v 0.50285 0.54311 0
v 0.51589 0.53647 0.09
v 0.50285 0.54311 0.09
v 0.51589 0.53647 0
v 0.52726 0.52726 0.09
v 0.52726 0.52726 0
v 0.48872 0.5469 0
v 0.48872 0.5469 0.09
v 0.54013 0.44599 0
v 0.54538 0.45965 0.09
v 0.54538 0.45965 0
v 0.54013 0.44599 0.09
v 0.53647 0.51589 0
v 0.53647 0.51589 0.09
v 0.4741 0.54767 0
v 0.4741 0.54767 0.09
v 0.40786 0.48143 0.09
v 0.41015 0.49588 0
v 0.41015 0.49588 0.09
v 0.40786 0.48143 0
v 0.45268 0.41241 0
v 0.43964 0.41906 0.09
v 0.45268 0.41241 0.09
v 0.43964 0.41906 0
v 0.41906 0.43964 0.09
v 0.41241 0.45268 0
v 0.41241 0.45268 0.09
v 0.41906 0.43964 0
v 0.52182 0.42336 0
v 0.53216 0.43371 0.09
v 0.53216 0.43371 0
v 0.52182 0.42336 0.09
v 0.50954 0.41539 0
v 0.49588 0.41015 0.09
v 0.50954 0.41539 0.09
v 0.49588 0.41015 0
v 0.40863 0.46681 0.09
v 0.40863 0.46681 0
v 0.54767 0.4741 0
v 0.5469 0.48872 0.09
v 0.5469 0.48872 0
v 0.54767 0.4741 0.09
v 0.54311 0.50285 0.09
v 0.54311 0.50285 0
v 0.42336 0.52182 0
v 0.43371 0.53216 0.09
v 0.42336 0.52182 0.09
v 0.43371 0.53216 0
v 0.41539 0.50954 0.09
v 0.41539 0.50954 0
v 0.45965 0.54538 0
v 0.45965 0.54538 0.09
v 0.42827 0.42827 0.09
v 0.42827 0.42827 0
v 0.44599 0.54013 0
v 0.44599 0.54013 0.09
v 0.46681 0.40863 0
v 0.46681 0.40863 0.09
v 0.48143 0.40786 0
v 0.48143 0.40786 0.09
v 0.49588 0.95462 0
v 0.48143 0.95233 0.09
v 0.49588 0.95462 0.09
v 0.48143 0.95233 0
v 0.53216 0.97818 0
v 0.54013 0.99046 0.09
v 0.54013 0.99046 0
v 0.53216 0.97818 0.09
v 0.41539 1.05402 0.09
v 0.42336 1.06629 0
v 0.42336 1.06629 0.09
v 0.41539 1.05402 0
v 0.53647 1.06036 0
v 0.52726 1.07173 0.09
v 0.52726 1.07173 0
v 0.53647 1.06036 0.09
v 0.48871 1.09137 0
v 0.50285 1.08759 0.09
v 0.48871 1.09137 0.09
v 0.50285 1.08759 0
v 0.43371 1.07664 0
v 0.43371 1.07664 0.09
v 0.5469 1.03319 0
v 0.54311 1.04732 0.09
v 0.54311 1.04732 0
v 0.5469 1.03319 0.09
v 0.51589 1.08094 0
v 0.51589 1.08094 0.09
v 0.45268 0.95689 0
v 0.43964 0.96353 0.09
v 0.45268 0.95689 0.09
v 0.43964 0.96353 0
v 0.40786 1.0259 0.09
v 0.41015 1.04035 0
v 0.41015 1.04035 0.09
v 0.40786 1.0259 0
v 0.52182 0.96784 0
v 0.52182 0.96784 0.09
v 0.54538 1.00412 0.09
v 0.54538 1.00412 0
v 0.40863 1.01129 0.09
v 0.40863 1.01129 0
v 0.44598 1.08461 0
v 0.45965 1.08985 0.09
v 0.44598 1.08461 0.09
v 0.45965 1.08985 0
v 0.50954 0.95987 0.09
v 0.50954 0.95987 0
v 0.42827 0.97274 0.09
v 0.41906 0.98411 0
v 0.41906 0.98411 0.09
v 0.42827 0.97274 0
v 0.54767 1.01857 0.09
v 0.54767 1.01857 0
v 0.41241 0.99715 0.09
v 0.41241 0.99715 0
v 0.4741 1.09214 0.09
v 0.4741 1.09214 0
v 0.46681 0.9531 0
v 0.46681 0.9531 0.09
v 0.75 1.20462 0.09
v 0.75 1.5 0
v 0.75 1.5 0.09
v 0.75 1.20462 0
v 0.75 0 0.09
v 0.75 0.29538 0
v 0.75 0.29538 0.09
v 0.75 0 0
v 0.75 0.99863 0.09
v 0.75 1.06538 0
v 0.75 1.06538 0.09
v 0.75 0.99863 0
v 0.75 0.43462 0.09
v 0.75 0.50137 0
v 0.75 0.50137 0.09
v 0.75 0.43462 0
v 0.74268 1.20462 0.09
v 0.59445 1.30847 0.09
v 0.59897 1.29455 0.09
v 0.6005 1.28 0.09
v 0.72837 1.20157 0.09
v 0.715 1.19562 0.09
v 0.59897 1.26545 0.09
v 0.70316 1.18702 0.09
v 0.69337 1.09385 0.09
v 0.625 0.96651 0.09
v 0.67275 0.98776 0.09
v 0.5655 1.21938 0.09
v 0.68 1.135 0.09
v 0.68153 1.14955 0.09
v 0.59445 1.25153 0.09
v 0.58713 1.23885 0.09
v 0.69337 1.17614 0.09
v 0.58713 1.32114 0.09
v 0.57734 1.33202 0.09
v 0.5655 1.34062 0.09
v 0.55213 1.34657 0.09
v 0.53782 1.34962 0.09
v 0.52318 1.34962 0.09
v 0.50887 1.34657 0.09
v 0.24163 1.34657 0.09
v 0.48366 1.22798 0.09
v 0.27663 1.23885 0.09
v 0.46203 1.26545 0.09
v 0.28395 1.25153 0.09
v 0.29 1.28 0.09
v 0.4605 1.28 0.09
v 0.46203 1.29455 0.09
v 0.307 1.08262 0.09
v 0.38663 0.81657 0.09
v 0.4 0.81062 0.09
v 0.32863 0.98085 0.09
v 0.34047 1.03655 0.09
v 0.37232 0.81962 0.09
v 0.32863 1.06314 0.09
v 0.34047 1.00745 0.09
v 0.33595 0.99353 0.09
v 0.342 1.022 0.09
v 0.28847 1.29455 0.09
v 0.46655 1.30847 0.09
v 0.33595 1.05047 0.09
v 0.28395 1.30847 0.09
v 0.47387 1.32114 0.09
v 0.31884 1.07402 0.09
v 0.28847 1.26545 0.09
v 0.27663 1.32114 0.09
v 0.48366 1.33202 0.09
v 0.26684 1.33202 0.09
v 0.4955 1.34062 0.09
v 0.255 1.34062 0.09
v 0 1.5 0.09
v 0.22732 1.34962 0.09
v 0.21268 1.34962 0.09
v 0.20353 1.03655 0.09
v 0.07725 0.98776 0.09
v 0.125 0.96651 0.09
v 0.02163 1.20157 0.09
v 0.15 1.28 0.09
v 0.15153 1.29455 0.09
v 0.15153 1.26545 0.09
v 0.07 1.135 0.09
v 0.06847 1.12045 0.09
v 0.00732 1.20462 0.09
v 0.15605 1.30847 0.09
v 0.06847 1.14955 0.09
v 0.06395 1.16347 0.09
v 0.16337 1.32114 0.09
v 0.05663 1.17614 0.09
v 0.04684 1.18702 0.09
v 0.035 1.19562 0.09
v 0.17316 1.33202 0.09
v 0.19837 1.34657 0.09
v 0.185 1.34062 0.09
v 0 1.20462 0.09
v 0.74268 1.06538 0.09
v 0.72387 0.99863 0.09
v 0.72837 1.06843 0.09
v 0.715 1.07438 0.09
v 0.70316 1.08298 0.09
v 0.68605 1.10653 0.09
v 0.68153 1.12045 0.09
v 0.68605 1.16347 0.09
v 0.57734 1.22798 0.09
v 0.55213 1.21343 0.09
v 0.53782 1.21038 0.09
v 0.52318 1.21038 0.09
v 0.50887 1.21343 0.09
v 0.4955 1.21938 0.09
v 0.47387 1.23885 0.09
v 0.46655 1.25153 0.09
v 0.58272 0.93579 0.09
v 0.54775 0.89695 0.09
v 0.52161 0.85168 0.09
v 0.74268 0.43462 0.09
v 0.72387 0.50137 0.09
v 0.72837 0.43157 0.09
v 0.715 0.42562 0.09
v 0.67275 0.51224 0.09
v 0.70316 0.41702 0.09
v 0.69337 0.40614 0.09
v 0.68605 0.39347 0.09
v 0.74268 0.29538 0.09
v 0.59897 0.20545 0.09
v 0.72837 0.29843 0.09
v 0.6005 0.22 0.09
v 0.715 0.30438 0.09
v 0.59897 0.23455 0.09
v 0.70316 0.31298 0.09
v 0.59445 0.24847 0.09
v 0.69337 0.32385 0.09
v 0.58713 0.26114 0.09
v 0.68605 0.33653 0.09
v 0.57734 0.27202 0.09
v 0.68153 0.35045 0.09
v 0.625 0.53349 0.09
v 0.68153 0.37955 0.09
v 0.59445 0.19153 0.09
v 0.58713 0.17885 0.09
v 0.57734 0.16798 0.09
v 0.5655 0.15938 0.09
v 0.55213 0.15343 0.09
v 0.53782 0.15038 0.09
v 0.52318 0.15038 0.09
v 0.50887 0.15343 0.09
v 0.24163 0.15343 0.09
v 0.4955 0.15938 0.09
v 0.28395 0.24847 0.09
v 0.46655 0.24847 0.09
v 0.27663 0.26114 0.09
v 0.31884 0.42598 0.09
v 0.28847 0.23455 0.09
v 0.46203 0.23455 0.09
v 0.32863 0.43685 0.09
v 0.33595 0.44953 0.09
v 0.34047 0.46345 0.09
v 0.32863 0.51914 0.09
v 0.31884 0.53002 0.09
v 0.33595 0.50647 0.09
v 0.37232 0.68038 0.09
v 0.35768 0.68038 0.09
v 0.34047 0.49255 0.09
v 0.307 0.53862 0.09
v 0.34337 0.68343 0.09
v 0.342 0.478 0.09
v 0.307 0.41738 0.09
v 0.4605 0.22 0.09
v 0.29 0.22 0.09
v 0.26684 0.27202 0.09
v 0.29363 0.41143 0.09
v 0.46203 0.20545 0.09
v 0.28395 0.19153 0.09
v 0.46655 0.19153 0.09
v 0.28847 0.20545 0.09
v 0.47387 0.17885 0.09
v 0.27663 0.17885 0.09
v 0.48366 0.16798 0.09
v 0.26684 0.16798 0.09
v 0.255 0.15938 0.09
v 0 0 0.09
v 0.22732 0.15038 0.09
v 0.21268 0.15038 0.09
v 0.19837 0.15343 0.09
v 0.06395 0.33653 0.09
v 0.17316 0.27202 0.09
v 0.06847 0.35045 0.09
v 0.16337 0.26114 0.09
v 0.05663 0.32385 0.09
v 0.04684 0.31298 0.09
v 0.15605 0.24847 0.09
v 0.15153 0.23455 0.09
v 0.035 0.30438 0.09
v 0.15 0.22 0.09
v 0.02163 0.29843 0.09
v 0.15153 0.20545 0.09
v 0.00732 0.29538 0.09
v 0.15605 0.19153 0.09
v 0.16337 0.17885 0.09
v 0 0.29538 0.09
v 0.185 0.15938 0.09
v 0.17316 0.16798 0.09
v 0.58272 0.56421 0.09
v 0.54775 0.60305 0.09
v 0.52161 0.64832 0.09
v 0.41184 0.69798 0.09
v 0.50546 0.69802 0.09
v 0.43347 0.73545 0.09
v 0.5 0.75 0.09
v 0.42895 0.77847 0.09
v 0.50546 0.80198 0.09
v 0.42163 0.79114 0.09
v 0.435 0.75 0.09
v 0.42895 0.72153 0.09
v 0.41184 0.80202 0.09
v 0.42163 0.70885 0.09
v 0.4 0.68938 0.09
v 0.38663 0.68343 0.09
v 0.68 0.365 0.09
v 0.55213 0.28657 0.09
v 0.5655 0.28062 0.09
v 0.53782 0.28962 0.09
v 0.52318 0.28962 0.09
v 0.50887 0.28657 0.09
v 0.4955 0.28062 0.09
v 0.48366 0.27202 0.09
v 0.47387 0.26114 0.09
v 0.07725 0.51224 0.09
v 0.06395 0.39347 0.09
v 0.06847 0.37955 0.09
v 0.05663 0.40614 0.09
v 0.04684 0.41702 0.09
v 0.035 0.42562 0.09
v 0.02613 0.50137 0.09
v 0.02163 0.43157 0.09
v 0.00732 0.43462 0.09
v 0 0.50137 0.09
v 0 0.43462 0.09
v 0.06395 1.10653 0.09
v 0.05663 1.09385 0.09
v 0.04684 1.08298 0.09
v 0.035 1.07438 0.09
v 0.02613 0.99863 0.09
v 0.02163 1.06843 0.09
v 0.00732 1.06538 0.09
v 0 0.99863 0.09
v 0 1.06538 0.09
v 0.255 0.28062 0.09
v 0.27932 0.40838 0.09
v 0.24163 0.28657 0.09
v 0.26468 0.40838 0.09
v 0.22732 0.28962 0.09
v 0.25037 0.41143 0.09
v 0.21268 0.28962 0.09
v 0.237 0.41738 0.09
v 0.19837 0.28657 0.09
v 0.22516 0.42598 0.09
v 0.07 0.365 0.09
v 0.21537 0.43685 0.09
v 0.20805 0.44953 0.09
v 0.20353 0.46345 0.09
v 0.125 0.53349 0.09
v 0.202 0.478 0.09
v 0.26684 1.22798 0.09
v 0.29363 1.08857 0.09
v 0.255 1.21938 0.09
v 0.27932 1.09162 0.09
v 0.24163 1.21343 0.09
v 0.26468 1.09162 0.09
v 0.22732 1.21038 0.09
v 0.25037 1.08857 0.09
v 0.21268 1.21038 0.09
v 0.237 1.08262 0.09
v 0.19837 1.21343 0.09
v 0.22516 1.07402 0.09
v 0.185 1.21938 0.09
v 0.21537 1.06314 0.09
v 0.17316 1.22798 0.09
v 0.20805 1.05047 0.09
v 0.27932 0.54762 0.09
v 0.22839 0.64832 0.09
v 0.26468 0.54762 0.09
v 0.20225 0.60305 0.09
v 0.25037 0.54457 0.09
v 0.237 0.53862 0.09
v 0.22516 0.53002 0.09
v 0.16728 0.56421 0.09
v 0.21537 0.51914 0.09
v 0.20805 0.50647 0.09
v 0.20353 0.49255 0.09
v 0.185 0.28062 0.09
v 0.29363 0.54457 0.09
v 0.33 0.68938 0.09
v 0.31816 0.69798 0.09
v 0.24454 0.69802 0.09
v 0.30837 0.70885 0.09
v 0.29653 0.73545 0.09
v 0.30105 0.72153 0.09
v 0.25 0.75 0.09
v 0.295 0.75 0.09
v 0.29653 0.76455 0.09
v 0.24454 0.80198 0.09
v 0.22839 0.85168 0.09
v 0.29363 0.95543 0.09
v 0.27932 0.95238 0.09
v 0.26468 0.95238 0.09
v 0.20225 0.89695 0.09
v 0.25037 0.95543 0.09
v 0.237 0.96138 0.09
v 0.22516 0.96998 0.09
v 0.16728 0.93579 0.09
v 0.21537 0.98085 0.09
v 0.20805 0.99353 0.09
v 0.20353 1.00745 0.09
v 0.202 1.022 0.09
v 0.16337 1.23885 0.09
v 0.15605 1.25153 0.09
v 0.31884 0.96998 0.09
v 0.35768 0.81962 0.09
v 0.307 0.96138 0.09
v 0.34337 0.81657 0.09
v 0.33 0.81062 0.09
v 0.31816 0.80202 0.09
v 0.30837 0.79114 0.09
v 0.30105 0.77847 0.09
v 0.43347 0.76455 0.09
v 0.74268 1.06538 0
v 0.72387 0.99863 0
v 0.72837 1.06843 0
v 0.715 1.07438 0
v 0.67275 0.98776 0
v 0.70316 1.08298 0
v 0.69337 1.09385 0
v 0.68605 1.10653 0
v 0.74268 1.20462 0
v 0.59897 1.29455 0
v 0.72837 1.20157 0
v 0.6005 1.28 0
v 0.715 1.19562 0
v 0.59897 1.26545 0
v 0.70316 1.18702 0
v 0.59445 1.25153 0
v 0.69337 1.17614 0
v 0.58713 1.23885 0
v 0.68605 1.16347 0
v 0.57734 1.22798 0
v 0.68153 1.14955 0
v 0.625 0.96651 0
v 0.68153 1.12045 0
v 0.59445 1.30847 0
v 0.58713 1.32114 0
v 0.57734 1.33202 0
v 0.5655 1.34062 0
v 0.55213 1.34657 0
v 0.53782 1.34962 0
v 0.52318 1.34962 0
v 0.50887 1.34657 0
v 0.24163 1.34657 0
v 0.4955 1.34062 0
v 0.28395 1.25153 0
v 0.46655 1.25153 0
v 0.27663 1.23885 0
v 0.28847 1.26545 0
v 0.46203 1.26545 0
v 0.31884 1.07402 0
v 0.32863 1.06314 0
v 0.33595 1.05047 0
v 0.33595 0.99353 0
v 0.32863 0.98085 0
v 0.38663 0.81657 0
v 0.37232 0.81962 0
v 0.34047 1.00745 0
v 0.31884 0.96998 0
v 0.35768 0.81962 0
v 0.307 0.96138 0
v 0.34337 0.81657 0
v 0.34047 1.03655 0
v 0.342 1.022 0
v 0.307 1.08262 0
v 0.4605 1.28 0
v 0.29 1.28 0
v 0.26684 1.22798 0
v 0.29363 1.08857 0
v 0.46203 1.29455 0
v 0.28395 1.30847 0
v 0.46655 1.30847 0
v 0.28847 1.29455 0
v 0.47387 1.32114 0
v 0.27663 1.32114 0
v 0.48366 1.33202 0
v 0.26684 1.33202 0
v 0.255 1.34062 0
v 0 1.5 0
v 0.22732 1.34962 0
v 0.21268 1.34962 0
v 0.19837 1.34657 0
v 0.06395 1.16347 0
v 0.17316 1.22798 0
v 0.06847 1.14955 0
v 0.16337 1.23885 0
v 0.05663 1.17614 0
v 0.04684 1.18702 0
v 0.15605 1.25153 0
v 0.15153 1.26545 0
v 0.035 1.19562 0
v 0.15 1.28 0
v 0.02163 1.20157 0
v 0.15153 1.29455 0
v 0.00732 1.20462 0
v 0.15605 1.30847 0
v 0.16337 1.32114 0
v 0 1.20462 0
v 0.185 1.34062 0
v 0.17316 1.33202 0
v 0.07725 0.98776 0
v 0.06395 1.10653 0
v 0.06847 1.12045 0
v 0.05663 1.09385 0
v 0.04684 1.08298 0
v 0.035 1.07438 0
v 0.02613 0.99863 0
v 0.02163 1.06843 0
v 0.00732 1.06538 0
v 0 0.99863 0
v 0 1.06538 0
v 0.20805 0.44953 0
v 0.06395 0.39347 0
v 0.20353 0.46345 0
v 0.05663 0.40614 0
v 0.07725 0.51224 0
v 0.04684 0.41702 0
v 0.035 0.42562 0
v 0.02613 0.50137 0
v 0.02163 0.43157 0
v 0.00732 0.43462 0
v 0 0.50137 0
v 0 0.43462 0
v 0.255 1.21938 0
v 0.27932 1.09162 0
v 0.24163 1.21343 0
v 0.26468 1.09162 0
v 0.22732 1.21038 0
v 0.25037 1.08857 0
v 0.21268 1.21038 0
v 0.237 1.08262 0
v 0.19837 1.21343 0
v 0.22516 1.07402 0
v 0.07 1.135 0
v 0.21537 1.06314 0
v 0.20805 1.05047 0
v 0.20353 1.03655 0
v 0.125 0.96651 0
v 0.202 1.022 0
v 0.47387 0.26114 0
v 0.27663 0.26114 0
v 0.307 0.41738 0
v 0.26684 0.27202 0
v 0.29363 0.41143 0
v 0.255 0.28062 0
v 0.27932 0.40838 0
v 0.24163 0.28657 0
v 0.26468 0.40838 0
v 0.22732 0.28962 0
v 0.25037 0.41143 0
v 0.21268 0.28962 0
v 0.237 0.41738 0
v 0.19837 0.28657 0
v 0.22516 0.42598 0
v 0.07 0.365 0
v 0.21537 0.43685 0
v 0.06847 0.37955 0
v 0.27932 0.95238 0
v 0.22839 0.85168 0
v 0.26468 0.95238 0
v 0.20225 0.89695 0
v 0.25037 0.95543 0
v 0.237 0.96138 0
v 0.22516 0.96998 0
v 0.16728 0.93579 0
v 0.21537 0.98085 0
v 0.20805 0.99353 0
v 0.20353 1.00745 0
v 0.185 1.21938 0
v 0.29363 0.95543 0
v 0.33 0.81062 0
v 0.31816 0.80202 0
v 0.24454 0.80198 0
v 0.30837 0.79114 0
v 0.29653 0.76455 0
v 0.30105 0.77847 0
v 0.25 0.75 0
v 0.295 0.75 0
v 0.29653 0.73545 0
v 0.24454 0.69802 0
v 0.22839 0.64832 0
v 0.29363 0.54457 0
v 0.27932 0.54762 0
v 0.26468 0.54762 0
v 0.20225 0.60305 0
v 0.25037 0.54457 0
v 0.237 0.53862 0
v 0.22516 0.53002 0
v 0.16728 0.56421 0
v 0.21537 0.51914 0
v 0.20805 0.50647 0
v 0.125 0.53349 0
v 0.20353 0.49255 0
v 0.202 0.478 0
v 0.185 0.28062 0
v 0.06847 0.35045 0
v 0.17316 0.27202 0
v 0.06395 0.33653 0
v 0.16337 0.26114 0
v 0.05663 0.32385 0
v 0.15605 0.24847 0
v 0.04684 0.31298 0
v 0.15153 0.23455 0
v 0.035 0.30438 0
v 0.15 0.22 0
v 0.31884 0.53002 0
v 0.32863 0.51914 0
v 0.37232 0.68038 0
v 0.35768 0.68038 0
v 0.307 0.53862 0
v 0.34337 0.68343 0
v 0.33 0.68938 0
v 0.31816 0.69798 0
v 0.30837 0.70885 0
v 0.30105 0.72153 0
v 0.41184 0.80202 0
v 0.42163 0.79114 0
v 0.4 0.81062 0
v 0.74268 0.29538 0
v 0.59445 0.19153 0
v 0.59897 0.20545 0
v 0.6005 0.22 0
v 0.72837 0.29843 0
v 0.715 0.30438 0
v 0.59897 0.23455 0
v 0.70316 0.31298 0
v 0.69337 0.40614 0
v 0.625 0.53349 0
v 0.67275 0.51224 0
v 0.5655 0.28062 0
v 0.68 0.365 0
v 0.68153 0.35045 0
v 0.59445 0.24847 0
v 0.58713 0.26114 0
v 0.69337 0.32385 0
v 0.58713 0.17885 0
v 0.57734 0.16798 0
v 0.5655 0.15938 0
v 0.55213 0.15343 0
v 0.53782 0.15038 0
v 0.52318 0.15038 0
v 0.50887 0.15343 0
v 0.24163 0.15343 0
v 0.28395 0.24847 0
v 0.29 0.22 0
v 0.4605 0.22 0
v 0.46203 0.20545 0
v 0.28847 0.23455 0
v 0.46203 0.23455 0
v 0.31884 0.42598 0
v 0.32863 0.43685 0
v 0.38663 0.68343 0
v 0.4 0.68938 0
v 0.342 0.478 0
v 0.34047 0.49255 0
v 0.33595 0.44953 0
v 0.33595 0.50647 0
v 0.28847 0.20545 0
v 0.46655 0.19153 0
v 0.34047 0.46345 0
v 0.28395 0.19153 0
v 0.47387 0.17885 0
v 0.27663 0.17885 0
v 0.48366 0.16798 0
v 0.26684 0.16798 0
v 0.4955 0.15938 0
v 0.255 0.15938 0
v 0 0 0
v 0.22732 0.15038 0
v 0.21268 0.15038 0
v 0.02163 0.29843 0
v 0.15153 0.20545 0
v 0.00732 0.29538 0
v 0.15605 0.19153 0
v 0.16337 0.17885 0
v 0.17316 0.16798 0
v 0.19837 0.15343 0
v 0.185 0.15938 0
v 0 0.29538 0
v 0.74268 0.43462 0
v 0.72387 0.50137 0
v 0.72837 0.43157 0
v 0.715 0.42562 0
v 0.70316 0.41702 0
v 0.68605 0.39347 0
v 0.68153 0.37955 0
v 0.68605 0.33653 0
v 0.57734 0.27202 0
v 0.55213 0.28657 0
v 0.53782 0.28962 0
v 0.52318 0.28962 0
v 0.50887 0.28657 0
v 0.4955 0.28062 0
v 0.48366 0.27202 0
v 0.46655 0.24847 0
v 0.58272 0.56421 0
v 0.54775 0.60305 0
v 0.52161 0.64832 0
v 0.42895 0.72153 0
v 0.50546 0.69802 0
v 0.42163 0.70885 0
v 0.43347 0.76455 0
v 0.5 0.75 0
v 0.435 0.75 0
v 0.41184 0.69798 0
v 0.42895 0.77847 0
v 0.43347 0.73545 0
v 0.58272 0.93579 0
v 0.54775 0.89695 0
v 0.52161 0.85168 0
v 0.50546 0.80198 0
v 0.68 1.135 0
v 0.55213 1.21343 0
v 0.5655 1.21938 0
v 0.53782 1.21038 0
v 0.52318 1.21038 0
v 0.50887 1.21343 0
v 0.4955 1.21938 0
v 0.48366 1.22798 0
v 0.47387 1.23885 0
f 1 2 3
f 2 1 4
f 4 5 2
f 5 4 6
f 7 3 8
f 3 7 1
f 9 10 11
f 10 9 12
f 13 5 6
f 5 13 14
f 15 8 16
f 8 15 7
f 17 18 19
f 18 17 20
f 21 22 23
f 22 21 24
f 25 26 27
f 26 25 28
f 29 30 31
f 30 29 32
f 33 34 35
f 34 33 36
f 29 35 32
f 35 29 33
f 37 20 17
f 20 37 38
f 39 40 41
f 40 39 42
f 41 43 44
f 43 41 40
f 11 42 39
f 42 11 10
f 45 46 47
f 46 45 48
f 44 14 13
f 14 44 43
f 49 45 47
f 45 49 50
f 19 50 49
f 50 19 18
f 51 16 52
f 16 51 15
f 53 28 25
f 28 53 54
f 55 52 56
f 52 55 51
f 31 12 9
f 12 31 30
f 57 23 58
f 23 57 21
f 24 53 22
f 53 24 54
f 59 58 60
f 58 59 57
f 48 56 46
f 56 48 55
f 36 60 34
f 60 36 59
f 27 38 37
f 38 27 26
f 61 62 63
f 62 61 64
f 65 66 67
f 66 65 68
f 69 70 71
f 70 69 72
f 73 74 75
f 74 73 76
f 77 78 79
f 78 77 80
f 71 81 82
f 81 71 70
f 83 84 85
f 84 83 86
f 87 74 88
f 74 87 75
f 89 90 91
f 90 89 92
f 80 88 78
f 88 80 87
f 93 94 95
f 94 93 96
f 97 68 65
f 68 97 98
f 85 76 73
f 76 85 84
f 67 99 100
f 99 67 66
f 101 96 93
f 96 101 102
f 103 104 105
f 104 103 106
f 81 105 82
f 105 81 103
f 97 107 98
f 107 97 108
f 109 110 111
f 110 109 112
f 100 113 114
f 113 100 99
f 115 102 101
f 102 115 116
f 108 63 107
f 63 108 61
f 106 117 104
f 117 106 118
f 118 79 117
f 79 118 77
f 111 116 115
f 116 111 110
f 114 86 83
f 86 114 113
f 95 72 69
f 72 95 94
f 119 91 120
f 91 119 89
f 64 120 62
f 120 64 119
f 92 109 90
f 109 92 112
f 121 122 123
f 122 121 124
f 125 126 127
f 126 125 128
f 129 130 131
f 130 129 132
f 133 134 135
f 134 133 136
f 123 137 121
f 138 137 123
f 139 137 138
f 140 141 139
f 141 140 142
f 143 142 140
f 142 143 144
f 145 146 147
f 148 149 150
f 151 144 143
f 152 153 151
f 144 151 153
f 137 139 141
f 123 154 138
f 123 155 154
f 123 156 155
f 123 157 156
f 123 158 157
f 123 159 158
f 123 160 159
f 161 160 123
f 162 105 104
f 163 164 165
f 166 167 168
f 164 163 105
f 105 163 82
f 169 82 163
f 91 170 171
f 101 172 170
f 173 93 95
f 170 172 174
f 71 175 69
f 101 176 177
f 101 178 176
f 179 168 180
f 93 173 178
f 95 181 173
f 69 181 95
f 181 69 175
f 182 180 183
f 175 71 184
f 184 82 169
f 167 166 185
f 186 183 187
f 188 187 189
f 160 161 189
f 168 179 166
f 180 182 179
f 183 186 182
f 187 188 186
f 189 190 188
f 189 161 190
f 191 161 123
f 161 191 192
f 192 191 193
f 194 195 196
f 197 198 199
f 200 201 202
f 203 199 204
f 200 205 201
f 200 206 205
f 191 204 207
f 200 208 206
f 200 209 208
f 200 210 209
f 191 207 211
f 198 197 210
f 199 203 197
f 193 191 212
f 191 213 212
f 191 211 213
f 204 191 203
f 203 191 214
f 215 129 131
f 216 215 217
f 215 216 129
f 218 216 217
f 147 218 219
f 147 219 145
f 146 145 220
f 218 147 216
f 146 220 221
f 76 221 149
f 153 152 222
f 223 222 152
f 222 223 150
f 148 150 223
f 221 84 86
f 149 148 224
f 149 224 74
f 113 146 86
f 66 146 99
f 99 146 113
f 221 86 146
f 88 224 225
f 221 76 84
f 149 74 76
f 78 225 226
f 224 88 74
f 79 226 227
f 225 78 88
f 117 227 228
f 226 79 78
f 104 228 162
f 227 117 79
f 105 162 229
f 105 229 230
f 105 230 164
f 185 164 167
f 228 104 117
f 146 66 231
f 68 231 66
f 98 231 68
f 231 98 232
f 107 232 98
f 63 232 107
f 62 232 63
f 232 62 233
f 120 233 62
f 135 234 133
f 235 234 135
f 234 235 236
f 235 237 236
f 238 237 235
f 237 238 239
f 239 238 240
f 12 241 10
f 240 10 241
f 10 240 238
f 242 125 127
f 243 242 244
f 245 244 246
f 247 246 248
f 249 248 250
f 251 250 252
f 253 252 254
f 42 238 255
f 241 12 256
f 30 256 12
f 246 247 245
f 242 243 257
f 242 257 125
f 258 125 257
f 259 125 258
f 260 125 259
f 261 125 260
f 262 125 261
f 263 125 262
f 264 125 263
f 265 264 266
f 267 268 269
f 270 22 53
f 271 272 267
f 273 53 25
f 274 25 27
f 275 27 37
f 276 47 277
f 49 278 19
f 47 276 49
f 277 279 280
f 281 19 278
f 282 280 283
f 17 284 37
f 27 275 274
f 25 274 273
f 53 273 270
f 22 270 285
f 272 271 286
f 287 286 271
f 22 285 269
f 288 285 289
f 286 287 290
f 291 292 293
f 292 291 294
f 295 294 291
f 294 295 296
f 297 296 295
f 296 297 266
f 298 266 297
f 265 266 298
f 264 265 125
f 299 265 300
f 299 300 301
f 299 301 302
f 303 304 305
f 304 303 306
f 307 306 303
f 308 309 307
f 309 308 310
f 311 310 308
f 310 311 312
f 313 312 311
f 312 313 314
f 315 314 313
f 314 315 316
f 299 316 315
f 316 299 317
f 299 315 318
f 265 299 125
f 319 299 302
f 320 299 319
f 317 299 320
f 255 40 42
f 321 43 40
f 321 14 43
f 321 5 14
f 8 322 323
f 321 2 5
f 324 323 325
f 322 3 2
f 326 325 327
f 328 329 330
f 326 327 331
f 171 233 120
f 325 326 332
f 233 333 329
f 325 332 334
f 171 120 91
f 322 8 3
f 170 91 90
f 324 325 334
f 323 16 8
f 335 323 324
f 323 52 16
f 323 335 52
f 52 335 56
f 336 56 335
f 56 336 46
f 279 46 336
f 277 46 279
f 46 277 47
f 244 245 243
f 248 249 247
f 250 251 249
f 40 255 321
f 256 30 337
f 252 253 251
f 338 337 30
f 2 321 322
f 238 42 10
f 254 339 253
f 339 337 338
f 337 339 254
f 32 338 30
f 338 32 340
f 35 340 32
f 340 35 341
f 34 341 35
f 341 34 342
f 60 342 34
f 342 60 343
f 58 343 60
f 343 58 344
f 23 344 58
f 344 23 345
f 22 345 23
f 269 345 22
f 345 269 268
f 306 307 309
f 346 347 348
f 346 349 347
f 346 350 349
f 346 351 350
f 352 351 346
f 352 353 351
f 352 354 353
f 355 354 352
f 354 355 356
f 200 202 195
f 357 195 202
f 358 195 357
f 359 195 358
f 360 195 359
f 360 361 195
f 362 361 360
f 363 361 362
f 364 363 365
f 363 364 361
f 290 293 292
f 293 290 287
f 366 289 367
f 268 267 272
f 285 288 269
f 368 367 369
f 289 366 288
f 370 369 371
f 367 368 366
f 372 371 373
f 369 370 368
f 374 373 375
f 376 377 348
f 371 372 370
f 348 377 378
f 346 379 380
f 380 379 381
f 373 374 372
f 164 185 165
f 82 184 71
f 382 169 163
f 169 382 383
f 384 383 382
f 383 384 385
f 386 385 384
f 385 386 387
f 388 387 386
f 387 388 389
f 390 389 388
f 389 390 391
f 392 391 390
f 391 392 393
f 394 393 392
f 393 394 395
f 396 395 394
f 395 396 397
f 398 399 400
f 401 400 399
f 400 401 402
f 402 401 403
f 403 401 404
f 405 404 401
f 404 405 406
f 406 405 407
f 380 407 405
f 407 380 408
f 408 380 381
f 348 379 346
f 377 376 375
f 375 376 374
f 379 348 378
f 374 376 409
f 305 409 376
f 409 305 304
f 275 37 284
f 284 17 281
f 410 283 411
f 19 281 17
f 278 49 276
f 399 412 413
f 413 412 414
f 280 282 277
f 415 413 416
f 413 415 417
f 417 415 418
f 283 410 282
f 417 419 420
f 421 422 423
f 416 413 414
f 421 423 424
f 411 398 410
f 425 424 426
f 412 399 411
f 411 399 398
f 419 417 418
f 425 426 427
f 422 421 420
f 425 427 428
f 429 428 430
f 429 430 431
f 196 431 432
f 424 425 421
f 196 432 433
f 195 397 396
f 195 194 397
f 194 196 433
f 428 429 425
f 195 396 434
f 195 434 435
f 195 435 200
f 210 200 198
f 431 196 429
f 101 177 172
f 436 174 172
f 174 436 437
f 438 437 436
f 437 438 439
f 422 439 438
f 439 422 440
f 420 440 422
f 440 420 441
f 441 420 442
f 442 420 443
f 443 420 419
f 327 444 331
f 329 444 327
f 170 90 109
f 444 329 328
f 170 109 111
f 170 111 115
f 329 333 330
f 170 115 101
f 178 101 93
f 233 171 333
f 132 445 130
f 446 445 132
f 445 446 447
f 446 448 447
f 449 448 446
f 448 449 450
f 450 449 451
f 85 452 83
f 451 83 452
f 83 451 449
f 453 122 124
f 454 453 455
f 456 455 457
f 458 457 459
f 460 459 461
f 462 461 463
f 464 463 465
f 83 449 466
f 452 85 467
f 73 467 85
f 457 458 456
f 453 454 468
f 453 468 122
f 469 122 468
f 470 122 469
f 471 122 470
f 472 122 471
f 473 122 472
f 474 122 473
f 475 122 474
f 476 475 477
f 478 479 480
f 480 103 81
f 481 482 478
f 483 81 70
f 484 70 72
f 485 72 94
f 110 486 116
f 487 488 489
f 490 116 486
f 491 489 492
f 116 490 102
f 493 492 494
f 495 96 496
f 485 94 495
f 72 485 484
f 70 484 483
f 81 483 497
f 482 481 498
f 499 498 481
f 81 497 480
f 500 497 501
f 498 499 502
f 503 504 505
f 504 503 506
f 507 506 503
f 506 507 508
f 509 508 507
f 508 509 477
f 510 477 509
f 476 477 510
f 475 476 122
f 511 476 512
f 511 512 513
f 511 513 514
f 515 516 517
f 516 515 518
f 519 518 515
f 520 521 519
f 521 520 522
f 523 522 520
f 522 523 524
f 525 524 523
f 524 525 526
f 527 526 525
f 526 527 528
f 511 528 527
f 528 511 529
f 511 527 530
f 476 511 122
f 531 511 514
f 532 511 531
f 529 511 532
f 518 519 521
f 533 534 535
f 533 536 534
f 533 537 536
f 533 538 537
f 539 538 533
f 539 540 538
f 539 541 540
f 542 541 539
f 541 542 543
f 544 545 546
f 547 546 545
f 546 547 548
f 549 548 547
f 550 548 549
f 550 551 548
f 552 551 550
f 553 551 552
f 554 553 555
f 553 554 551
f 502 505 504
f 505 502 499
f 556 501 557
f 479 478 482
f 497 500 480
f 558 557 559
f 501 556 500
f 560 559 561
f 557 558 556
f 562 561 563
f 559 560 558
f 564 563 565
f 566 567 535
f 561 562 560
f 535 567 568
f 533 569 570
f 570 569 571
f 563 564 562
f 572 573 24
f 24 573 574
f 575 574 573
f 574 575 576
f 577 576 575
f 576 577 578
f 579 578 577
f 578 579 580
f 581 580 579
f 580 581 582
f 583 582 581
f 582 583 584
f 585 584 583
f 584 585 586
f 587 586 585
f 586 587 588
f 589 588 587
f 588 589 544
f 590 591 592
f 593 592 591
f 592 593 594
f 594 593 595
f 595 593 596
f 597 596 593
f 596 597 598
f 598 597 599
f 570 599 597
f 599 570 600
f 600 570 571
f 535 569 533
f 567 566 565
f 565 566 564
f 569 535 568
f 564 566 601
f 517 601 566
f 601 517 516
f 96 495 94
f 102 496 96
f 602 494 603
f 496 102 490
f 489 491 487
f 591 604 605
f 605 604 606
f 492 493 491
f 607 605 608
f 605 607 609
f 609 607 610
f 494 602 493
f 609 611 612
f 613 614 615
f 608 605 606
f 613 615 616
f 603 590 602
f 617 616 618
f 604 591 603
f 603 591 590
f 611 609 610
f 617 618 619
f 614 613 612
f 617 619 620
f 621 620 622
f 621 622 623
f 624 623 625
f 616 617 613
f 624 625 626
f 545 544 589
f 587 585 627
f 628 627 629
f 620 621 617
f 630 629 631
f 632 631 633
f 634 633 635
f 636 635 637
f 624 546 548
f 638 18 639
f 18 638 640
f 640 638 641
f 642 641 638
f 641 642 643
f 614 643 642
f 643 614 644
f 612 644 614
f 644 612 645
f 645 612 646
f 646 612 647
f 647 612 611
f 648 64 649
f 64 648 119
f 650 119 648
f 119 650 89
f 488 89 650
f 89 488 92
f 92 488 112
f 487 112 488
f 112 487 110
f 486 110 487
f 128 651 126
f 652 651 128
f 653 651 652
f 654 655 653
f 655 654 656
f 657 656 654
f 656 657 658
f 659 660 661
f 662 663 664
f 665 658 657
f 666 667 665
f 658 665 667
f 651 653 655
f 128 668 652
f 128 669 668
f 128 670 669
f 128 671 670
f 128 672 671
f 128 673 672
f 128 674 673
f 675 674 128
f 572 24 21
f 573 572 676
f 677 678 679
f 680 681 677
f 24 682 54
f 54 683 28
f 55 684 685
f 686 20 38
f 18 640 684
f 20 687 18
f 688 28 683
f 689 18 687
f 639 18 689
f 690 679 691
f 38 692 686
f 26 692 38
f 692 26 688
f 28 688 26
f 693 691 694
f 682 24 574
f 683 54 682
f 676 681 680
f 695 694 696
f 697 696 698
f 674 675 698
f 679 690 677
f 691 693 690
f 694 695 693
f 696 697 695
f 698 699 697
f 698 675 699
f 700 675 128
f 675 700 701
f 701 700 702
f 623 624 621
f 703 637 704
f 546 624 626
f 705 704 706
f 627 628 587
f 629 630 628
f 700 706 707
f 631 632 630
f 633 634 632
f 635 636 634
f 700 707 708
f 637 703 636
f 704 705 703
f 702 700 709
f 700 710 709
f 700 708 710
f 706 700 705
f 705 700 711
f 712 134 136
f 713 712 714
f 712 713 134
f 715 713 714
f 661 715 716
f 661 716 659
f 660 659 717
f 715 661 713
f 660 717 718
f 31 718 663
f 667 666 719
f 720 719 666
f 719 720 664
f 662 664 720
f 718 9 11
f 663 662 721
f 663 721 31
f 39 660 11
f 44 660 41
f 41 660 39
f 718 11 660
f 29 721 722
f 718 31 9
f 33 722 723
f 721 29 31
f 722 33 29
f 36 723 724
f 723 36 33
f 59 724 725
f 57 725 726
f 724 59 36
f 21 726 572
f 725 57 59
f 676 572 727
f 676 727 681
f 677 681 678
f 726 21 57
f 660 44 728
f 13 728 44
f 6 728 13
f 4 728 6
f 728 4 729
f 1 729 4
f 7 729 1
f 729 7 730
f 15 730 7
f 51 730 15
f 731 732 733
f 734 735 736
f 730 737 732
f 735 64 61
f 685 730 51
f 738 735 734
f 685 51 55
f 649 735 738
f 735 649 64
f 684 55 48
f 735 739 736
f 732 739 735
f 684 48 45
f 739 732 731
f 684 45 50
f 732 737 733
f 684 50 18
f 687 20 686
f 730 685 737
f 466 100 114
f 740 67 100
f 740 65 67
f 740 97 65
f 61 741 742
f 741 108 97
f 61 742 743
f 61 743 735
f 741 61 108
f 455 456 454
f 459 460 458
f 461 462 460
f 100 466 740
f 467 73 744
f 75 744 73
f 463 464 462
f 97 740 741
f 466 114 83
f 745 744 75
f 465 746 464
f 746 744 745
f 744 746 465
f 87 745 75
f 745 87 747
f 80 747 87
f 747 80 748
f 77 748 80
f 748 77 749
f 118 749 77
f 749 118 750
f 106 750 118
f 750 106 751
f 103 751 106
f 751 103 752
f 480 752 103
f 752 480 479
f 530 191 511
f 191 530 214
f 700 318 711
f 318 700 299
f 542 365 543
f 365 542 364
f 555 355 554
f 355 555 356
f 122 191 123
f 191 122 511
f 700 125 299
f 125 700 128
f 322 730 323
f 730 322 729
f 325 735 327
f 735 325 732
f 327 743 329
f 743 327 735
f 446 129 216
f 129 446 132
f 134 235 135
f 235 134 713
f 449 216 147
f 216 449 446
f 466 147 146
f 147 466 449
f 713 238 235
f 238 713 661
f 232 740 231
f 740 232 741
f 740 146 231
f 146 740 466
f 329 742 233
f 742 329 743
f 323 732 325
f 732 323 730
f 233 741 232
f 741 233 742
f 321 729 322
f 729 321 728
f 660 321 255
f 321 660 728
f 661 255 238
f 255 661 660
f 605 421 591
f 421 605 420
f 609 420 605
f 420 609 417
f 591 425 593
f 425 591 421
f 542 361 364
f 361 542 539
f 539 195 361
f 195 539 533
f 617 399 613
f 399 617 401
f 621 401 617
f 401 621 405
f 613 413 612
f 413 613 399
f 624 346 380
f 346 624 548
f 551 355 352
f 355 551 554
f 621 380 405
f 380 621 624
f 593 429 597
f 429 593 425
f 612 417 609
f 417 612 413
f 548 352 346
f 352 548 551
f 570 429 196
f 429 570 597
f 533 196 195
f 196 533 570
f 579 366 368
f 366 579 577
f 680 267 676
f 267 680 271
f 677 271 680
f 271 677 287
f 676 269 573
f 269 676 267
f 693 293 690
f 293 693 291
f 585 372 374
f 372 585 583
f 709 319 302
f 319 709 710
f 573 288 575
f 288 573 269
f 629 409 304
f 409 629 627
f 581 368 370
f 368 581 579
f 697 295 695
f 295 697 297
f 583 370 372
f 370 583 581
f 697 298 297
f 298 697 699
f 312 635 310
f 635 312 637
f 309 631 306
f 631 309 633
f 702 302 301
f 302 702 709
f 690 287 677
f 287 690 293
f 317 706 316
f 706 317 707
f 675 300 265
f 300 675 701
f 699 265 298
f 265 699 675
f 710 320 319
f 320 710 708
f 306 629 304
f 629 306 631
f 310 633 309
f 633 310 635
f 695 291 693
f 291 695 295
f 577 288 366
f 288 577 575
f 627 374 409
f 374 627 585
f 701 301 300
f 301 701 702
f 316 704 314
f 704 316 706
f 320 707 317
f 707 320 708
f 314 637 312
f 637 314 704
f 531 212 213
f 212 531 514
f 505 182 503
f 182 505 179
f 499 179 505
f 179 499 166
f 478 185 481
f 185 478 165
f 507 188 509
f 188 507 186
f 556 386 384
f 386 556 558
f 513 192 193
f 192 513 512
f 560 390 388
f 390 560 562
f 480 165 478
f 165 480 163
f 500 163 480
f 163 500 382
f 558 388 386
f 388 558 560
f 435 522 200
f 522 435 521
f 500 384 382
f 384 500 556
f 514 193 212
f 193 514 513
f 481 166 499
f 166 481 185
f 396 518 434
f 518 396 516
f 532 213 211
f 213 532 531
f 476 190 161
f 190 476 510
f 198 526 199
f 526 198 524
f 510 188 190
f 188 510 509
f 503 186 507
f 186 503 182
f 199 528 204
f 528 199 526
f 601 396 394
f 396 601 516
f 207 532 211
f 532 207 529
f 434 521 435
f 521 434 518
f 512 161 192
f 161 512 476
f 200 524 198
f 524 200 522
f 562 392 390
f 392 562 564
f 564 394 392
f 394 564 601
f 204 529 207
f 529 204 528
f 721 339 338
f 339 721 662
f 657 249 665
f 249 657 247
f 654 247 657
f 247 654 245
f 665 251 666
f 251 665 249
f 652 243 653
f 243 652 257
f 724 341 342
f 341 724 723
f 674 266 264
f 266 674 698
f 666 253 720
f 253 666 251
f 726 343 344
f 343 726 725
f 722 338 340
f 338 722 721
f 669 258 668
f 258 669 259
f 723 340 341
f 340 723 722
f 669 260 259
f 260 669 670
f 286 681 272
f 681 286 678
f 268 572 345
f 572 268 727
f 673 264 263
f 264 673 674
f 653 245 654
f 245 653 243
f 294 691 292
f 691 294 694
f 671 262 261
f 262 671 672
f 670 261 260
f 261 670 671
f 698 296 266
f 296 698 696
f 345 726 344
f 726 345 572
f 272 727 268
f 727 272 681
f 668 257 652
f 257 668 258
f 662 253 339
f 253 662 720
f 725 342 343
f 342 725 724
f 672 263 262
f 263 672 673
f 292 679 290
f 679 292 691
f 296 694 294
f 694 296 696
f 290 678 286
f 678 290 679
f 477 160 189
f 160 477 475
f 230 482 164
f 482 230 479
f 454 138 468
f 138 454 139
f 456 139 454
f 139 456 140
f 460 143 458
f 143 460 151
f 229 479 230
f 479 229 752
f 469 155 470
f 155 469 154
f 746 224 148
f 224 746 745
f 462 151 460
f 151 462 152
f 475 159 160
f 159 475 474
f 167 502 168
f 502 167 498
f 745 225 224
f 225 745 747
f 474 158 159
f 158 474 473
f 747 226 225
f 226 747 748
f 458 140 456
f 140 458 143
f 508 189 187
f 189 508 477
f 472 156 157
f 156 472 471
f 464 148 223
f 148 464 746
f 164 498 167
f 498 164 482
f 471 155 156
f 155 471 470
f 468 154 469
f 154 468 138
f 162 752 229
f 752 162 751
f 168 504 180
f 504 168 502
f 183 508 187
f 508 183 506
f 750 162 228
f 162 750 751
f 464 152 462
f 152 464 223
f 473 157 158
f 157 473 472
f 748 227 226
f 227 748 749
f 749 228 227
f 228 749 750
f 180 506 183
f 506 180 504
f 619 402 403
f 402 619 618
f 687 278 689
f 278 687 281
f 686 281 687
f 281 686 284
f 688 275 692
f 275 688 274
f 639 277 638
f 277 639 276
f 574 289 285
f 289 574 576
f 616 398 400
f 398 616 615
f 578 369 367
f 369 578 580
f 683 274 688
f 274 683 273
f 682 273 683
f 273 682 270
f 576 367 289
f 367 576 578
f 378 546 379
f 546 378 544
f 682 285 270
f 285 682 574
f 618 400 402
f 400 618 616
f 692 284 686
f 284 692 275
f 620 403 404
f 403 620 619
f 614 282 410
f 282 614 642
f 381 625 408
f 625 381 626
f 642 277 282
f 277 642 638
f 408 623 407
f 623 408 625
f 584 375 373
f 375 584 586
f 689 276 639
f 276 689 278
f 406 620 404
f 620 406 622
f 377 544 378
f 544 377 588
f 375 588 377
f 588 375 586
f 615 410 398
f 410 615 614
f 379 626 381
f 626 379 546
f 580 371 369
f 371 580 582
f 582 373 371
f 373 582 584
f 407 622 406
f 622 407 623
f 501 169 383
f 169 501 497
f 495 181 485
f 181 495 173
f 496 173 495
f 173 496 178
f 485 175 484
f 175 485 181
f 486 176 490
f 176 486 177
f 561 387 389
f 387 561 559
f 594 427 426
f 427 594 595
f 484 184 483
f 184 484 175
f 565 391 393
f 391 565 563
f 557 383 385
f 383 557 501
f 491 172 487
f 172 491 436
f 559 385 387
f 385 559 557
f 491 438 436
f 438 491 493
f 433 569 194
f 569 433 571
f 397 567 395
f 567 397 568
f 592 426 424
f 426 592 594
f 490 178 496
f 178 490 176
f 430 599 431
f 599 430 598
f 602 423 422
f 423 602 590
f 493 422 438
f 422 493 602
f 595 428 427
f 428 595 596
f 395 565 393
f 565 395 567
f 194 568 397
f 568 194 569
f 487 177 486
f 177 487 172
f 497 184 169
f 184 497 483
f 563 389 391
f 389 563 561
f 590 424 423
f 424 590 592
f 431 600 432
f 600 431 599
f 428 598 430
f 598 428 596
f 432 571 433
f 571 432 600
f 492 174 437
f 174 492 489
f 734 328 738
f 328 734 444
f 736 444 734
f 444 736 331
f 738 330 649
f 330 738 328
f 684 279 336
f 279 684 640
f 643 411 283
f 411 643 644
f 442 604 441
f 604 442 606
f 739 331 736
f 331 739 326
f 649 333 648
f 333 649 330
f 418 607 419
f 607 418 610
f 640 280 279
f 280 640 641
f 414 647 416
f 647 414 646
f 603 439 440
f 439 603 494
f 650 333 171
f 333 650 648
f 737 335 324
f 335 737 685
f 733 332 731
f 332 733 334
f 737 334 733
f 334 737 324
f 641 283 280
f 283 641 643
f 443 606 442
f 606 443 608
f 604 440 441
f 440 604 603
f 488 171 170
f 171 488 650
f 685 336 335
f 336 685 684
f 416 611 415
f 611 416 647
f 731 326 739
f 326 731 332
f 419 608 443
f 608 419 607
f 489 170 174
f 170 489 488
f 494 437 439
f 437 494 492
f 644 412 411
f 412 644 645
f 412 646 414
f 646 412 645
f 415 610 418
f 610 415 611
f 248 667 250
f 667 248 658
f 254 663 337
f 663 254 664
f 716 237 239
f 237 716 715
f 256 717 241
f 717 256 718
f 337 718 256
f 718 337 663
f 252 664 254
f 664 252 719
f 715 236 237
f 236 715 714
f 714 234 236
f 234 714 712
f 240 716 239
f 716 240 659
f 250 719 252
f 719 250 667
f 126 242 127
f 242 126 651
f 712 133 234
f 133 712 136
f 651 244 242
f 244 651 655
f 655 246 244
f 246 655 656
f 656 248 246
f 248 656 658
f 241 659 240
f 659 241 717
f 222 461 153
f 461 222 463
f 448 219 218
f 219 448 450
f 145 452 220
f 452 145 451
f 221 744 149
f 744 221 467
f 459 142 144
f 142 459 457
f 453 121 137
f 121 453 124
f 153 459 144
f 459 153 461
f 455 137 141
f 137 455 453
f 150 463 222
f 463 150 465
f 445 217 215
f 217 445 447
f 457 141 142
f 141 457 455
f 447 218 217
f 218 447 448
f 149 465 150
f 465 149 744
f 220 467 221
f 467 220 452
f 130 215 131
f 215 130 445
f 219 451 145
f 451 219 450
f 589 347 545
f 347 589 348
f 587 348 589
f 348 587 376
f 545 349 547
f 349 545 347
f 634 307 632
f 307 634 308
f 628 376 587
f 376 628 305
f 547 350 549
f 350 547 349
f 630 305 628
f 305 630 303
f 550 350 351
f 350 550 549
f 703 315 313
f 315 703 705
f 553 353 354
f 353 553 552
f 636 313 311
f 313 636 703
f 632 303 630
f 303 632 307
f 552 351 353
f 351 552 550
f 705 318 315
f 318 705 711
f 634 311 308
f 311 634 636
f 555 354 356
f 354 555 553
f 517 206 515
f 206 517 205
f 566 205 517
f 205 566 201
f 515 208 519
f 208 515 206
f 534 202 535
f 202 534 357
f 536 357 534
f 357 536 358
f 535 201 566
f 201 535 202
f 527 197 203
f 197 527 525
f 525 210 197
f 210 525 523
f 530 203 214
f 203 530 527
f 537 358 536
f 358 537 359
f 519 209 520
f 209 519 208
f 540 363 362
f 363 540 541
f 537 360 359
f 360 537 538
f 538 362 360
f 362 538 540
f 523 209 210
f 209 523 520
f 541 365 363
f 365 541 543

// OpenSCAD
/*
 * This is the side face of a channel.
 */
module channel_half_mid_side() {
   face_depth=0.09;
   hole_extension=0.1;
   hole_height=face_depth+2*hole_extension;
   difference() {
      // the face
      cube(size=[0.75,1.5,face_depth]);
      // the central hole
      translate([0.75,0.75,-hole_extension]) cylinder(h=hole_height, r=0.25);
      translate([0,0.75,-hole_extension]) cylinder(h=hole_height, r=0.25);
      // the outer-most holes - the 1.5 hub holes
      translate([0.22,0.22,-hole_extension]) cylinder(h=hole_height, r=0.07);
      translate([0.22,1.5-0.22,-hole_extension]) cylinder(h=hole_height, r=0.07);
      // more holes
      translate([0.75-0.439/2,0.22,-hole_extension]) cylinder(h=hole_height, r=0.07);
      translate([0.75-0.439/2,1.5-0.22,-hole_extension]) cylinder(h=hole_height, r=0.07);
      // more holes
      translate([0.75-0.956/2,0.75-0.544/2,-hole_extension]) cylinder(h=hole_height, r=0.07);
      translate([0.75-0.956/2,0.75+0.544/2,-hole_extension]) cylinder(h=hole_height, r=0.07);
      // more holes - the 0.77 hub holes
      translate([0.75-0.77/2,0.75,-hole_extension]) cylinder(h=hole_height, r=0.07);
      translate([0.75,0.75-0.77/2,-hole_extension]) cylinder(h=hole_height, r=0.07);
      translate([0.75,0.75+0.77/2,-hole_extension]) cylinder(h=hole_height, r=0.07);
      // more holes - the 0,77 holes at the end
      translate([0,0.75-0.77/2,-hole_extension]) cylinder(h=hole_height, r=0.07);
      translate([0,0.75+0.77/2,-hole_extension]) cylinder(h=hole_height, r=0.07);
      // more holes - the 0.77 hub holes
      translate([0.75,0.75,0])
         rotate(a=45, v=[0,0,1]) {
            translate([-0.77/2,0,-hole_extension]) cylinder(h=hole_height, r=0.07);
            translate([0,0.77/2,-hole_extension]) cylinder(h=hole_height, r=0.07);
         }
   }
}
$fs=0.01;
channel_half_mid_side();
